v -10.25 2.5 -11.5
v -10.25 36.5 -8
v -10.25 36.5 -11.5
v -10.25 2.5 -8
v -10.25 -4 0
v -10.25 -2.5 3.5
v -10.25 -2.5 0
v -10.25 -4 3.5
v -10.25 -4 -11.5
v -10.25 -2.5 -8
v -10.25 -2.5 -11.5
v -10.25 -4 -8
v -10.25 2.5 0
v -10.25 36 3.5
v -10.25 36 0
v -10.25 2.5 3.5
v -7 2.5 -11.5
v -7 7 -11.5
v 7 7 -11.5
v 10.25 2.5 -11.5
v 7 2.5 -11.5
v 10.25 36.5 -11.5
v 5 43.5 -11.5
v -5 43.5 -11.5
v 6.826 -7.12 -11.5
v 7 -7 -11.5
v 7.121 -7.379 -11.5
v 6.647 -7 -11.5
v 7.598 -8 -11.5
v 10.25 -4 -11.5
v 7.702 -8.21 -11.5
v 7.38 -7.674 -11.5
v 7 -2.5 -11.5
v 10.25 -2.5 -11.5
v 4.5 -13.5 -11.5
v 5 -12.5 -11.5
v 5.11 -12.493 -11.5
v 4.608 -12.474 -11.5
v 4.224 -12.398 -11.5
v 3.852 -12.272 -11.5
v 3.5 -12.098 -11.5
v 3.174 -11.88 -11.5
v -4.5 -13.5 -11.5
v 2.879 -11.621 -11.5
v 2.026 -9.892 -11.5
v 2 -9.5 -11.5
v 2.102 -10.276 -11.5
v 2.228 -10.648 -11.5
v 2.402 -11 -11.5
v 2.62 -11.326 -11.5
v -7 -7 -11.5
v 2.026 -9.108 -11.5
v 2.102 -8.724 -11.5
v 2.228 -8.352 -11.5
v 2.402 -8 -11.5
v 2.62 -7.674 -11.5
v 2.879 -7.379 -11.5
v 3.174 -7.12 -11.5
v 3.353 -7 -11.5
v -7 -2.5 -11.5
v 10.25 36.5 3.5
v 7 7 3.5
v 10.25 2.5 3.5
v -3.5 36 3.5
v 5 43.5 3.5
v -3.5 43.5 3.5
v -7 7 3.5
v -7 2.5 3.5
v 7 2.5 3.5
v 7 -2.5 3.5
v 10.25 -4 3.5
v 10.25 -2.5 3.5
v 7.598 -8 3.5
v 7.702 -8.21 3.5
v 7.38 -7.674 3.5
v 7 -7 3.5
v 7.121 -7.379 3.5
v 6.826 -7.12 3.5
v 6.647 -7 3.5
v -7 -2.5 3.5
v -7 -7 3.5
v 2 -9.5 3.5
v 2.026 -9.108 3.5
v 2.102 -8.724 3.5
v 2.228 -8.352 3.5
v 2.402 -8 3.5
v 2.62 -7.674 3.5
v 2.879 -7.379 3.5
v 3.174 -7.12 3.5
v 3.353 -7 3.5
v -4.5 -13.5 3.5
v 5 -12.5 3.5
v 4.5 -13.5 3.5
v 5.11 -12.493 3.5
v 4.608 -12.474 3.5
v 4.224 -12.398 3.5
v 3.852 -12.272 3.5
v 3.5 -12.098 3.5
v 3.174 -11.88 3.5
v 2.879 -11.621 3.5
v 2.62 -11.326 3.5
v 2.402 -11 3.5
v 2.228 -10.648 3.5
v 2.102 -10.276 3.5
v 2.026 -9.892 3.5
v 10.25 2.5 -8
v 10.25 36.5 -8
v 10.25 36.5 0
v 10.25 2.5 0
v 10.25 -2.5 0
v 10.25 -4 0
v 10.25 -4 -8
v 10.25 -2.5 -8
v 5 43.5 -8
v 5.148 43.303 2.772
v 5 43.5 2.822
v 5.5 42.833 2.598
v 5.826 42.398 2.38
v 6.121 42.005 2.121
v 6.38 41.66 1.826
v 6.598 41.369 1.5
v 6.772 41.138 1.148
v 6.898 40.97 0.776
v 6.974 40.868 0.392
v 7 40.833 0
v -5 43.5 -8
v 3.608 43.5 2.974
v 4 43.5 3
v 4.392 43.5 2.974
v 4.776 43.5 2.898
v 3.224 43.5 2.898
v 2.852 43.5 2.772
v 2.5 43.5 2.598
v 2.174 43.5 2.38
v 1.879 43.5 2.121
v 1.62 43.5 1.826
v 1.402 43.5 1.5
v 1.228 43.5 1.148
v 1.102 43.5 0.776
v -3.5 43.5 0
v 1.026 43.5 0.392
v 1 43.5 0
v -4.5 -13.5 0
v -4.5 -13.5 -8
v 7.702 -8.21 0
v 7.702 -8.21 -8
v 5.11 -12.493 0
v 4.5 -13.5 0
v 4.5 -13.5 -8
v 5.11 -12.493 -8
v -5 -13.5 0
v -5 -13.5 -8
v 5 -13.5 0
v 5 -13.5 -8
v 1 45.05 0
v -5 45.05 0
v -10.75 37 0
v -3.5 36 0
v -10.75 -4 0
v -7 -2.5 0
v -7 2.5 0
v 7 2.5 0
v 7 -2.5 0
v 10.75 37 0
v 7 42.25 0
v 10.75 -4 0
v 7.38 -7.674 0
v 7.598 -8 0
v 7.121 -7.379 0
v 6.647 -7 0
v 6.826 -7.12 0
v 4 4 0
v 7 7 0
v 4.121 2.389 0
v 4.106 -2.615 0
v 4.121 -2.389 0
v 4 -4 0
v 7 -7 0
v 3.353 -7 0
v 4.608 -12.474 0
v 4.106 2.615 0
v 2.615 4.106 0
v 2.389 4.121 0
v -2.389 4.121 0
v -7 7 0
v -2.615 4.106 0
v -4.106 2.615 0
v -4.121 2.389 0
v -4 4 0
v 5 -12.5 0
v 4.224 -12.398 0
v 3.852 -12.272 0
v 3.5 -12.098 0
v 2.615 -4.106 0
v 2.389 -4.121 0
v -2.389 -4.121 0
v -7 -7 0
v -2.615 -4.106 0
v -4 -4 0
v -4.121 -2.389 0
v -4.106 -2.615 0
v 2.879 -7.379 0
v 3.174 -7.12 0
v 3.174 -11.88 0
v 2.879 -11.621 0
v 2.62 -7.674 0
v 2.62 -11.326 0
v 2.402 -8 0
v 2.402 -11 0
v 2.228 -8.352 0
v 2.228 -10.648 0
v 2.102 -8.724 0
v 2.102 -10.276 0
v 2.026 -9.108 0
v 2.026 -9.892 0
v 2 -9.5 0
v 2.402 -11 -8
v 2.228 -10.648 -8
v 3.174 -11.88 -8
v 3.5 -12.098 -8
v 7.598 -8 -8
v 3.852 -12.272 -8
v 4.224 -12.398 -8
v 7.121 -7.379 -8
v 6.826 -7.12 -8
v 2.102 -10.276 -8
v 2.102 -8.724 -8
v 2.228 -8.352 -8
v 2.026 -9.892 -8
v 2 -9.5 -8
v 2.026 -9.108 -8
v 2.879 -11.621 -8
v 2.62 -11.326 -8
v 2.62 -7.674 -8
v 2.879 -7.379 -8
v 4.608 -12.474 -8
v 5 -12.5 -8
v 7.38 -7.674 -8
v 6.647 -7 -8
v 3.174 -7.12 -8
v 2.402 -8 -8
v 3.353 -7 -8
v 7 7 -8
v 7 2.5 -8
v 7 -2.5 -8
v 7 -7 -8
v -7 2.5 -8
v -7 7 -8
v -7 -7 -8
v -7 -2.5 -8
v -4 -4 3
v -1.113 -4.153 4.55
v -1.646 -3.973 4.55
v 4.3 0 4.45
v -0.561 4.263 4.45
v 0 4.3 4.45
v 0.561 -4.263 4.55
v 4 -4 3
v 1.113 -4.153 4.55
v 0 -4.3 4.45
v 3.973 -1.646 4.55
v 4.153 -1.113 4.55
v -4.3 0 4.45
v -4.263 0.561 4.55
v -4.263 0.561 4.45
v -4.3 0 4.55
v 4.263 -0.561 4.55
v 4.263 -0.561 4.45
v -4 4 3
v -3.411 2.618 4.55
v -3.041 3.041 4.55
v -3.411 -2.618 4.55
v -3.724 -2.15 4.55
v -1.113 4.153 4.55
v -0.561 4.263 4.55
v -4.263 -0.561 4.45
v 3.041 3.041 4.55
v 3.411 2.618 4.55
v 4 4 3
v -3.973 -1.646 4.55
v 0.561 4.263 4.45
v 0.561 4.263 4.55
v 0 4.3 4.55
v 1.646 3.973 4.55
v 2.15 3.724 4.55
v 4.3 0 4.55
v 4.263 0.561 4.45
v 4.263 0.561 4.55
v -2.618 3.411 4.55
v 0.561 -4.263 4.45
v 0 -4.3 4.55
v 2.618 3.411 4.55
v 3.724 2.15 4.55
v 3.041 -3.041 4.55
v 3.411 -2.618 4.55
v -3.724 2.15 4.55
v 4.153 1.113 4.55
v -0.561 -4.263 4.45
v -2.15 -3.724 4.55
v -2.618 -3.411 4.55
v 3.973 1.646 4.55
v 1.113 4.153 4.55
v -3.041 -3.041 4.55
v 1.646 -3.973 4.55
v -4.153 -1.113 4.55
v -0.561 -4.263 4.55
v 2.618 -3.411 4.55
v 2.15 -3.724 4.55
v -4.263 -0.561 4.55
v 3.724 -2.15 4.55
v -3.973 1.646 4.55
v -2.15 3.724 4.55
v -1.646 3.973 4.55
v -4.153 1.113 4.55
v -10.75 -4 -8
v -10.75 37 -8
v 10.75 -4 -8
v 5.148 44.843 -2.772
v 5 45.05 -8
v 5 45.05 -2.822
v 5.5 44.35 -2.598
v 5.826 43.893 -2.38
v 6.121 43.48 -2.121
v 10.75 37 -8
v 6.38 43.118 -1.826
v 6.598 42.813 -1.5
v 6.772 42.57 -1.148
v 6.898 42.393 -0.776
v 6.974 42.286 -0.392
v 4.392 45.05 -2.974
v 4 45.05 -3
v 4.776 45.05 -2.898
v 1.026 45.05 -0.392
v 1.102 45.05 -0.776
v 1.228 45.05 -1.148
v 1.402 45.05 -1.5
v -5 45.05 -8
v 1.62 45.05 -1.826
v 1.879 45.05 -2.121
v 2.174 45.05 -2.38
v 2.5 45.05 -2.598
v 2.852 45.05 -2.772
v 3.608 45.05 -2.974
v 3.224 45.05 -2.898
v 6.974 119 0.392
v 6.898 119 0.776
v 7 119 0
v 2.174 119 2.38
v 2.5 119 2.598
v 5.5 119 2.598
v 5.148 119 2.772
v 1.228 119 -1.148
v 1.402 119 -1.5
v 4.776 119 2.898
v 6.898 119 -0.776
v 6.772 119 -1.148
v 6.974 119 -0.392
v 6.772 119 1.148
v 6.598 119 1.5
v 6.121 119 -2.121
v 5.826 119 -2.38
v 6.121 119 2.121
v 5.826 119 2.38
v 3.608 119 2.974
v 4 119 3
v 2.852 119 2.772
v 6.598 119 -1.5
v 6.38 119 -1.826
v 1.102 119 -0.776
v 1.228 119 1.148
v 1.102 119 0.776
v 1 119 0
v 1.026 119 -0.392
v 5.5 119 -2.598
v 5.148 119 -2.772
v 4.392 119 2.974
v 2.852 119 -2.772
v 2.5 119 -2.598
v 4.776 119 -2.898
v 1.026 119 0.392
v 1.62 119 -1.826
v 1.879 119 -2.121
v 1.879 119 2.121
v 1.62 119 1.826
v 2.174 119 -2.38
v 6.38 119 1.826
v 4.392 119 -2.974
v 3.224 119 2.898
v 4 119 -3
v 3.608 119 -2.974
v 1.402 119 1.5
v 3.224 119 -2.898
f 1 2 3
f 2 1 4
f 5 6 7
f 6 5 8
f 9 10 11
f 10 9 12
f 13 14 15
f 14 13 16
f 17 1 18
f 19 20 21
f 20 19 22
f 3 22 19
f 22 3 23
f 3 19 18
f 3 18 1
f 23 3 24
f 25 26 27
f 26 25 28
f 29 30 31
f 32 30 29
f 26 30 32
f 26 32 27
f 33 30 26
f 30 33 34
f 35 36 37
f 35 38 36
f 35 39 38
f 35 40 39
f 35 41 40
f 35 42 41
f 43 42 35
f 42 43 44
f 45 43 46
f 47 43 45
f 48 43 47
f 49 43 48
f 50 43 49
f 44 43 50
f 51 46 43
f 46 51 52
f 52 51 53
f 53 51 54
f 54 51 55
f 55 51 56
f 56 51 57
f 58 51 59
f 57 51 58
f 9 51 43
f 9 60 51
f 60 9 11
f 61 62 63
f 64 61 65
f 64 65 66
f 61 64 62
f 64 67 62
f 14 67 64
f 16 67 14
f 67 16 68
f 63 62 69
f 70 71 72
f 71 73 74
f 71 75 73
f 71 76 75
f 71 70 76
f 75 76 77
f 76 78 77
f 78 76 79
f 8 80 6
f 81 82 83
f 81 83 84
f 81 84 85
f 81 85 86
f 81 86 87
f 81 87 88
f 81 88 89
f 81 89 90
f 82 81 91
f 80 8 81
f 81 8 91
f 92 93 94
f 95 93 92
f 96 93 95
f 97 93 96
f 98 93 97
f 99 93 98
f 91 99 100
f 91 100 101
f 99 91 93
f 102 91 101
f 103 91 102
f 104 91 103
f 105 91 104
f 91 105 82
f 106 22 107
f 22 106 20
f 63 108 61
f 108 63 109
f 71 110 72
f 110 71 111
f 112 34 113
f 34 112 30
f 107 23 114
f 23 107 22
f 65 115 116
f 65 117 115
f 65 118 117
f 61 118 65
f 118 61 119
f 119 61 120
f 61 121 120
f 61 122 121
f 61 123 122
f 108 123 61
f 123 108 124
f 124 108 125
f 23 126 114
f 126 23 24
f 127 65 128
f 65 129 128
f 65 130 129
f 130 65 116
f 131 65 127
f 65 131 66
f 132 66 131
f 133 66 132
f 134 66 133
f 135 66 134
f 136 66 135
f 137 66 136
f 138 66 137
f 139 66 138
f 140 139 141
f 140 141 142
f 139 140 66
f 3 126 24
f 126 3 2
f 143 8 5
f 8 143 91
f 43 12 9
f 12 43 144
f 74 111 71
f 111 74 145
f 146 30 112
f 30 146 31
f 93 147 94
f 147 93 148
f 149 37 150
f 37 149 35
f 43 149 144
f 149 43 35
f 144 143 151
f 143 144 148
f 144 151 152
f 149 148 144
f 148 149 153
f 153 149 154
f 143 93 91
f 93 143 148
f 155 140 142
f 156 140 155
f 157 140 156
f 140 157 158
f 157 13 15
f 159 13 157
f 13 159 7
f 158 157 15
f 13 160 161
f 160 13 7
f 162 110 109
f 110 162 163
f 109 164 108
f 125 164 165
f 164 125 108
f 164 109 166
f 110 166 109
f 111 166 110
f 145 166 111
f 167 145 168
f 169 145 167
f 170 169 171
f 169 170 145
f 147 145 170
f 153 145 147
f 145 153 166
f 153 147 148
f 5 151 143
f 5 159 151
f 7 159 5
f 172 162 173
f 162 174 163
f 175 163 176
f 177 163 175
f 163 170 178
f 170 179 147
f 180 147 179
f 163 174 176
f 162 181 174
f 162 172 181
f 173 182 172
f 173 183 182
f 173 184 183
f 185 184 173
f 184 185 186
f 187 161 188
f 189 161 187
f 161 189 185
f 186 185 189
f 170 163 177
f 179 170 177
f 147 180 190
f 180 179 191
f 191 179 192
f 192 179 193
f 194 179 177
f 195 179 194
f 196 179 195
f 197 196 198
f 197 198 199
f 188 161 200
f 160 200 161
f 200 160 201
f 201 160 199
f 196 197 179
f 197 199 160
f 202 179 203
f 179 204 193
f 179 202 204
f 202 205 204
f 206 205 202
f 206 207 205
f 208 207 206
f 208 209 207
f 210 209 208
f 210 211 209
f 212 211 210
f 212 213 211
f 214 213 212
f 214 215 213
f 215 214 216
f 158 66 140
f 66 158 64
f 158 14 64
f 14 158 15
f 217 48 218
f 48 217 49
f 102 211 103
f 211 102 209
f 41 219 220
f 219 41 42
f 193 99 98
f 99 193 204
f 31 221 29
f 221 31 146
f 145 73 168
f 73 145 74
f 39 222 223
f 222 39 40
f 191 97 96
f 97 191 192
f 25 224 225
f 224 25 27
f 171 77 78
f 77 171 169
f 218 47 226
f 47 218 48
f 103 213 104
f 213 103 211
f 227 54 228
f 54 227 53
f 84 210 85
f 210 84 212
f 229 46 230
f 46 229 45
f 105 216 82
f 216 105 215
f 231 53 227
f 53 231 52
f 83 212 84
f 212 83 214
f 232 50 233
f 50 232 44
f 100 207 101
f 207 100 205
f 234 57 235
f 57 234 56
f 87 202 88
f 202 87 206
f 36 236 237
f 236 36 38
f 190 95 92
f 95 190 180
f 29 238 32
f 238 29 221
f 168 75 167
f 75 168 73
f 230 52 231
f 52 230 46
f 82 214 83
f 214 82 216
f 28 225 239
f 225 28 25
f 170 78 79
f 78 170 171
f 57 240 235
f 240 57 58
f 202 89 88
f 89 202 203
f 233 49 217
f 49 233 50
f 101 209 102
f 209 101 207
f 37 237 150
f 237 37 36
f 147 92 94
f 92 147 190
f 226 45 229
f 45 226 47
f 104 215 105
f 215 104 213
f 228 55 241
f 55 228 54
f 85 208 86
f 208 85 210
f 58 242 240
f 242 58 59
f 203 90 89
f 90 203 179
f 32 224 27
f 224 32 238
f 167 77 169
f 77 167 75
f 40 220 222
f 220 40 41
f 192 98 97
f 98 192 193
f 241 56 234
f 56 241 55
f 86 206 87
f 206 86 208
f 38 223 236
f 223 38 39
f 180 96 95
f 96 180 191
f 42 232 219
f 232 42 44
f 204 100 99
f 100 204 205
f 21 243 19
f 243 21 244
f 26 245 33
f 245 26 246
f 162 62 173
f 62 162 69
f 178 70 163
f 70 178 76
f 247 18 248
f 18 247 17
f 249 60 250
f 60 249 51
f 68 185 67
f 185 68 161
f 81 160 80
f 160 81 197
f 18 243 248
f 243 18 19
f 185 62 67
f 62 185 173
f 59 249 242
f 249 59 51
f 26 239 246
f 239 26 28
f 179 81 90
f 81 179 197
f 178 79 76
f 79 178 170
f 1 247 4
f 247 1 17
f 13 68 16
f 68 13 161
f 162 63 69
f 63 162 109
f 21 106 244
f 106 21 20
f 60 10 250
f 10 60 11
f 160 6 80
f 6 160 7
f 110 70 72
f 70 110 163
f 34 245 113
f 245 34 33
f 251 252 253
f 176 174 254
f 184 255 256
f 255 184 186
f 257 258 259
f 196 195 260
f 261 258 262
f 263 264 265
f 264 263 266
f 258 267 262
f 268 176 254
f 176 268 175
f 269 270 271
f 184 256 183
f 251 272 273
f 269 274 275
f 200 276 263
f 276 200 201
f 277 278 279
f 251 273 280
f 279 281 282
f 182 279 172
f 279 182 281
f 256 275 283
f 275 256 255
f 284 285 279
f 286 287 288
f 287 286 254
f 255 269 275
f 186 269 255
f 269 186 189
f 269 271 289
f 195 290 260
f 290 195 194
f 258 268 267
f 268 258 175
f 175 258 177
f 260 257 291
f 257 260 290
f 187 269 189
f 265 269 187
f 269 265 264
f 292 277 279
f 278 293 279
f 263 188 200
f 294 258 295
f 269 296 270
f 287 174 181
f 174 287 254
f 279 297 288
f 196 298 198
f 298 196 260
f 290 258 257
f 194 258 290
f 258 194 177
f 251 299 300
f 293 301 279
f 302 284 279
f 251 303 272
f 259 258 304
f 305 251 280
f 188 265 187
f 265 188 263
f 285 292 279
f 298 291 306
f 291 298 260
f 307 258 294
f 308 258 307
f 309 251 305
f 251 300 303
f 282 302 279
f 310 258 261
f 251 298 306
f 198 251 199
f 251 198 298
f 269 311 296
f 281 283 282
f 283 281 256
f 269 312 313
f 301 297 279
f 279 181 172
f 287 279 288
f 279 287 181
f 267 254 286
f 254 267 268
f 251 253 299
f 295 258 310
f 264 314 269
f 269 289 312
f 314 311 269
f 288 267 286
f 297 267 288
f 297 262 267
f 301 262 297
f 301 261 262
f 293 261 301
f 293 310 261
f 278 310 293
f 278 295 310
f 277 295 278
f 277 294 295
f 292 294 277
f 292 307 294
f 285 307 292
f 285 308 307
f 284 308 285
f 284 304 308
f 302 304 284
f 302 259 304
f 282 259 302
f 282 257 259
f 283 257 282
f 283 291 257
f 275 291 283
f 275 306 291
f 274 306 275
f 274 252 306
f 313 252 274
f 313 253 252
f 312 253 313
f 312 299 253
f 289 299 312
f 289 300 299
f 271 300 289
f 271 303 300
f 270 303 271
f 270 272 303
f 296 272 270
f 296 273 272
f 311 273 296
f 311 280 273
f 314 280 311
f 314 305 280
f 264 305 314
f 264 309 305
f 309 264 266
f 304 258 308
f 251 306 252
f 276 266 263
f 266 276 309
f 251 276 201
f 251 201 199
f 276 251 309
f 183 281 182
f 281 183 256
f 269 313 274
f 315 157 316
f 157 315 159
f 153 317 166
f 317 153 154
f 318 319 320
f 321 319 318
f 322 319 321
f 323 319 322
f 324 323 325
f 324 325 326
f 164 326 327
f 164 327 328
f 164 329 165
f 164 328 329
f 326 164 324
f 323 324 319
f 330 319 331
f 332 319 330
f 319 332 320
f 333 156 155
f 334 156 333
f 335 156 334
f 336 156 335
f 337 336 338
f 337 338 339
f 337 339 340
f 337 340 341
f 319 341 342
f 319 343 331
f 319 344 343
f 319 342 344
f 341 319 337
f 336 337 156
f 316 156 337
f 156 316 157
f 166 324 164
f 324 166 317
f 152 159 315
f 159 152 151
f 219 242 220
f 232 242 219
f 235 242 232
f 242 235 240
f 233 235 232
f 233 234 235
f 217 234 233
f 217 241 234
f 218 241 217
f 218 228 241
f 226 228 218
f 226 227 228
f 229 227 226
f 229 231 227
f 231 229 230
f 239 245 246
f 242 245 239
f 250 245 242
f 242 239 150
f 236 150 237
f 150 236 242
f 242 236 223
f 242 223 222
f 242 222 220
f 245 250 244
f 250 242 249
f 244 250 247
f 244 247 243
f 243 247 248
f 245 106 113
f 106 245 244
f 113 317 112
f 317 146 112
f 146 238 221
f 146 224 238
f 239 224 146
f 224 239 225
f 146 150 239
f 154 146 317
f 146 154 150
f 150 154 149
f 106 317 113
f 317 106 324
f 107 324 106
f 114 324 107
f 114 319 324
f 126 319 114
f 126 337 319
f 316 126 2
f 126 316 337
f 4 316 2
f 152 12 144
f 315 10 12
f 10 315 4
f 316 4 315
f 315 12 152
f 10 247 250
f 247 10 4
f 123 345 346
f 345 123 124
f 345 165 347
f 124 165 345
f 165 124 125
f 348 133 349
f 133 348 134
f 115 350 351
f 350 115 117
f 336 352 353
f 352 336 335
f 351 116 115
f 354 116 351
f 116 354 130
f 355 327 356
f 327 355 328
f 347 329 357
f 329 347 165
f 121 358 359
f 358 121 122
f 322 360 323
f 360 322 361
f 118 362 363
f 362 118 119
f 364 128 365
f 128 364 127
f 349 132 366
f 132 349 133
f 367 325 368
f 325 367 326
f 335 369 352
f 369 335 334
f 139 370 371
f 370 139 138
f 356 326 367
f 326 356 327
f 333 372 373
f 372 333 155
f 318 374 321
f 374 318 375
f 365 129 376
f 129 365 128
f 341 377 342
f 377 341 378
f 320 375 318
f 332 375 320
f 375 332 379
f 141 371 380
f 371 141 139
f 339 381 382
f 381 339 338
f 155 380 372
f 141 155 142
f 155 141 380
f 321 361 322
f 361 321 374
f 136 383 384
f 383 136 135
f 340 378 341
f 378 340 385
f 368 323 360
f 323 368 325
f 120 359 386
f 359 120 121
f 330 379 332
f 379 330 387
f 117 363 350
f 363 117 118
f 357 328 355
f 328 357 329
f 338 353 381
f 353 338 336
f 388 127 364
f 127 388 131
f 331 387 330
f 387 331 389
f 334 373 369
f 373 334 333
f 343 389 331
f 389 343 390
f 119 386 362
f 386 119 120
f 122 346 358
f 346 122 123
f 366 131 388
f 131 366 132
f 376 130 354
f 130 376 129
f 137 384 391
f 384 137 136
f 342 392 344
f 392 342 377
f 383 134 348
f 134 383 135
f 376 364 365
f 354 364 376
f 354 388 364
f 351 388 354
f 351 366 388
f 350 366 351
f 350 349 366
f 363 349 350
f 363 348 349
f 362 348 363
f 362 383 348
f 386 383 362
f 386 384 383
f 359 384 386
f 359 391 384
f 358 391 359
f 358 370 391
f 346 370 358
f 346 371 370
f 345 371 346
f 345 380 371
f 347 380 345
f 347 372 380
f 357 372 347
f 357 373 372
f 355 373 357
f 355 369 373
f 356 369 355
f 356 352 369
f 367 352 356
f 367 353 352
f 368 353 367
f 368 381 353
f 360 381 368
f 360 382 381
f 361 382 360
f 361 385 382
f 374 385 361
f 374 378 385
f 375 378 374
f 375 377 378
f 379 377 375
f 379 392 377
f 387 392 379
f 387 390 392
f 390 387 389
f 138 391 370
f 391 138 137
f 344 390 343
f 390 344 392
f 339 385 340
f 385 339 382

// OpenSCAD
// file: ../libdict.scad
// This library add dictionary like features to openscad
// the dictionary is a list of pairs as we cannot define new types.
// Unlike a python dictionary we cannot do a proper hash table for speed
// so everything is build around the OpenSCAD search function
// There are a lot of assert statements to ensure data in the "dictionary"
// is in the format of
// * A list of lists
// * Each internal list has a length of two
// * First element of each internal list is a string (the key)
// * All keys are unique.


// Private function:
// This function returns true if the value is in the list
// value must be a string.
// No error checking, for use by is_in only!
function _is_in_str(value, list) =
    search([value], list) != [[]];

// Private function:
// This function returns true if the value is in the list
// value must be a number.
// No error checking, for use by is_in only!
function _is_in_num(value, list) =
    search(value, list) != [];


// This function returns true if the value is in the list
// value must be a string or a number.
function is_in(value, list) =
    assert(is_num(value) || is_string(value) , "is_in: value must be a number or string")
    assert(is_list(list), "is_in: list must be a list")
    is_num(value) ? _is_in_num(value, list) : _is_in_str(value, list);

/**
 * Sum a list
 * This recursive function sums a list.  It should be called with one
 * argument (the list); the other two arguments simply allow it to be
 * "tail-recursive" which lets OpenSCAD optimise it better.  This is
 * very close to the example given in the OpenSCAD docs.
 */
function _libdict_sum_list(list, starting_element=0, running_total=0) =
    starting_element >= len(list) ?
        running_total :
        _libdict_sum_list(list, starting_element + 1, running_total + list[starting_element]);

/**
 * When checking a list for uniqueness, we can get "errant matches".
 * An errant match is when a non-list matches with the first element in a list.
 * i.e. it would consider [1, [1,0]] to be non-unique. We cannot know which 
 * element is the non-list but we do know that it is errant if exactly one 
 * of them is not a list.
 * If two elements are non-lists, they must be identical in order to have matched.  
 * Similarly, if all elements are lists, they must be identical because ``search`` 
 * will have matched them as whole lists.
 * The argument "list" is the list we are checking for uniqueness, and "match" is 
 * a vector of indices that have been returned by ``search``.
 */
function _check_errant_match(list, match) = let(
    non_list = [for (m = match) is_list(list[m])? 0 : 1],
    number_of_non_lists = _libdict_sum_list(non_list)
) number_of_non_lists == 1 ? 0 : 1;

// Returns true if all emements in list are unique.
function is_unique(list) =
    assert(is_list(list), "is_unique: list must be a list")
    let(
        matches = search(list, list, 0),
        // Assign 1 or 0 depending on is the match length for each element
        // return wether any matches are greater than one (mathcing more than
        // itself)
        // note cannot search for true or false so using 1 and zero
        bool_list = [for (match = matches) if (len(match)==1) 0
            // should put a 1 here to show they matched but in the case of
            // [1, [1]] it will match both, so need to check if they are
            // both lists or both not list
            else _check_errant_match(list, match)]
    ) !is_in(1, bool_list);

// Private function:
// Checks that the input is a list and that every element is a list
// of length 2.
// No error checking, for use by valid_dict only!
function _is_pairs(list) =
    !is_list(list) ? false :
        len(list)==0 ? false :
            !is_in(0, [for (pair = list) is_list(pair) && len(pair)==2 ? 1: 0]);

// Private function:
// Checks all elements in the list are strings
// No error checking, for use by valid_dict only!
// Strings can't be empty
function _is_list_of_strings(list) =
    !is_in(0, [for (item = list) is_string(item) && len(item)>0 ? 1: 0]);

// Private function:
// Returns the keus in a dictionary
// No error checking, for use by valid_dict only!
function _keylist(dict)  = [for (pair=dict) pair[0]];

function valid_dict(dict) =
    //if the input are not pairs return instantly
    !_is_pairs(dict) ? false : let (
        //if they are pairs get all keys
        keys = _keylist(dict),
        all_strings =  _is_list_of_strings(keys),
        unique = is_unique(keys)
    ) (all_strings && unique) ? true : false;

// Key lookup for key value pair "dictionary".
// Unlike the built in lookup this works with strings.
function key_lookup(key, dict) =
    assert(is_string(key), "`key` must be a string")
    assert(valid_dict(dict), "`dict` must be a valid 'dictionary'")
    let(
        // key is in [] because otherwise openscad will search for each letter rather than the string.
        index = search([key], dict, 1, 0)[0]
    )  assert (index!=[], "Key lookup failed, key not found!") dict[index][1];

// Creates a new dictionary with a key value pair replaced. Pair must already
// be in dictionary.
function replace_value(key, value, dict) =
    assert(is_string(key), "`key` must be a string")
    assert(valid_dict(dict), "`dict` must be a valid 'dictionary'")
    assert(is_in(key, _keylist(dict)), "`key` not found in dictionary!")
    [for (kv_pair = dict) key!=kv_pair[0] ? kv_pair : [key, value]];


// Creates a new dictionary with a a set of key value pair replaced
// both inputs must be a dictionary. All keys in input must already be
// in dictionary
function replace_multiple_values(rep_dict, dict) =
    assert(valid_dict(rep_dict), "`rep dict` must be a valid 'dictionary'")
    assert(valid_dict(dict), "`dict` must be a valid 'dictionary'")
    let(
        // loop over all keys in replacement dict checking they are in the original
        rep_keys = [for (key = _keylist(rep_dict))
            assert(is_in(key, _keylist(dict)), "`key` not found in dictionary!")
            key
        ]
    ) //Finally return the updated dictionary using this long list comprehension.
    [
        for (kv_pair = dict) let(
            key = kv_pair[0],
            // check if this key is in the replacement dictionary and if so return index
            // key is in [] because otherwise openscad will search for each letter rather
            // than the string.
            index = search([key], rep_dict, 1, 0)[0]
            // if index is empty return original key value pair, else return the key with
            // the replaced value
        ) index == [] ? kv_pair : [key, rep_dict[index][1]]
    ];
// main file
/******************************************************************
*                                                                 *
* OpenFlexure Microscope: Logitech C270 screw-on-from-bottm mount *
*                                                                 *
* This is part of the OpenFlexure microscope, an open-source      *
* microscope and 3-axis translation stage.  It gets really good   *
* precision over a ~10mm range, by using plastic flexure          *
* mechanisms.                                                     *
*                                                                 *
* This file defines a camera mount (together with functions that  *
* return the mount height and sensor position) for the Logitech   *
* C270 webcam.                                                    *
*                                                                 *
*                                                                 *
* (c) Richard Bowman, January 2016                                *
* Released under the CERN Open Hardware License                   *
*                                                                 *
******************************************************************/


use <../utilities.scad>
use <../libdict.scad>

$fn=48;

function c270_camera_dict() = [["mount_height", 4.5],
                               ["sensor_height", 0.2]];//Height of the sensor above the PCB

function c270_camera_bottom_z() = -key_lookup("mount_height", c270_camera_dict());

// spacing of the lens mount holes at the sensor
function c270_camera_hole_spacing() = 8.25;
// position of camera board hole near the sensor
function c270_near_third_hole_pos() = [5,-9.5,0];
// position of camera board hole at the cable end 
function c270_far_third_hole_pos() = [-6,42.3,0];


module c270(beam_r=4.3, beam_h=4.5){
    //cut-out to fit Logitech C270 webcam
    //optical axis at (0,0)
    //top of PCB at (0,0,0)

    mirror([0,0,1]){ //parts cut out of the mount are z<0
        //beam clearance
        hull(){
            cube([8,8,6],center=true);
            translate_z(-beam_h){
                cylinder(r=beam_r,h=2*tiny(),center=true);
            }
        }

        //clearance for PCB
        hull(){
            translate([-10/2,-13.5,0]){
                cube([10,tiny(),8]);
                }
            translate([-21.5/2,-4,0]){
                cube([21.5,41,8]);
                }
            translate([-10/2,45,0]){
                cube([10,tiny(),8]);
                }
        }

        difference(){
            union(){
                // component clearance, cable end
                hull(){
                    translate([0,22.5,0+4]){
                        cube([20.5,28,15],center=true);
                    }
                    translate([0,34,0+4]){
                        cube([10,9.5*2,15],center=true);
                    }
                }
                // component clearance, sensor end
                hull(){
                    translate([0,10,0+4]){
                        cube([20.5,28,15],center=true);
                    }
                    translate([0,-4,0+4]){
                        cube([9,9.5*2,15],center=true);
                    }
                }
            }
            union(){
                // add cube at third mounting hole, cable end
                translate([-3.5,36,-10]){
                    mirror([1,0,0]){
                        cube([10,10,10]);
                    }
                }
                // add a pillar at the 'near third hole' place
                translate(c270_near_third_hole_pos()){
                    translate_z(-50){
                        cylinder(r=3, h=99, center = false);
                    }
                }
                // add mount around the camera sensor,
                // the same shape as the supplied lens mount
                cube([14,14,99], center = true);
                cube([21,5,99], center = true);
            }
        }


        //exit for cable
        translate([4,20,0]){
            rotate_x(-90){
                cylinder(r=3,h=99);
            }
        }
    }
}

//c270_camera_mount();
c270();

module c270_camera_mount(screwhole=true){
    // A mount for the Logitech C270 webcam
    // This should finish at z=0+tiny(), with a surface that can be
    // hull-ed onto the lens assembly.
    h = 58;
    w = 23.5;
    mounting_hole_x = c270_camera_hole_spacing();

    mount_height = key_lookup("mount_height", c270_camera_dict());
    rotate(-45){
        difference(){
            translate([-w/2, -13, -mount_height]){
                cube([w, h, mount_height]);
            }
            translate_z(-mount_height){
                c270();
                if(screwhole){
                    // mounting holes
                    reflect_x(){
                        translate_x(mounting_hole_x){
                            no1_selftap_hole(h=6);
                            // chamfer in base to overcome overextrusion
                            translate_z(-0.5){
                                cylinder(r1=2,h=2,r2=0,$fn=12);
                            }
                        }
                    }
                    // third mounting hole, cable end
                    translate(c270_far_third_hole_pos()){
                        no1_selftap_hole(h=6);
                        // chamfer in base to overcome overextrusion
                        translate_z(-0.5){
                            cylinder(r1=2,h=2,r2=0,$fn=12);
                        }
                    }
                }
            }
        }
    }
}

module c270_counterbore(){
    translate_z(c270_camera_bottom_z()-1){
        at_c270_hole_pattern(){
            cylinder(r=1.1, h=9, $fn=12);
        }
    }
    translate_z(c270_camera_bottom_z()+1){
        at_c270_hole_pattern(){
            cylinder(r=2.1, h=9, $fn=12);
        }
    }
}

module c270_camera_bottom_mounting_posts(optics_config, outers=true, cutouts=true, bottom_slice=false){
    if (bottom_slice){
        //if we want the bottom slice intersect with the bottom of the whole
        //post found by recalling the function
        intersection(){
            cylinder(h=tiny(), r=99);
            c270_camera_bottom_mounting_posts(optics_config, outers=outers, cutouts=cutouts);
        }
    }
    else{
        // posts to mount to Logitech C270 camera from below
        r1=3;
        r2=2.5;
        h = key_lookup("mounting_post_height", optics_config);
        at_c270_hole_pattern(){
            difference(){
                if(outers){
                    cylinder(r1=r1, r2=r2, h=h, $fn=12);
                }
                if(cutouts){
                    translate_z(h-6+tiny()){
                        // The C270 board holes are smaller than #2 screws
                        no1_selftap_hole(h=6);
                    }
                }
            }
        }
    }
}

module at_c270_hole_pattern(){
    // posts to mount to Logitech C270 camera from below

    screw_x = c270_camera_hole_spacing();
    // Third hole position at the far end of the board [-6,42.3,0] is too far away and makes 
    // the camera platform too big for mounting from above.
    //c270_third_hole_pos = [5,-9.5,0];
    rotate_z(-45){
        reflect_x(){
            translate([screw_x, 0, 0]){
                children();
            }
        }
        translate(c270_near_third_hole_pos()){
                children();
        }
    }
}
